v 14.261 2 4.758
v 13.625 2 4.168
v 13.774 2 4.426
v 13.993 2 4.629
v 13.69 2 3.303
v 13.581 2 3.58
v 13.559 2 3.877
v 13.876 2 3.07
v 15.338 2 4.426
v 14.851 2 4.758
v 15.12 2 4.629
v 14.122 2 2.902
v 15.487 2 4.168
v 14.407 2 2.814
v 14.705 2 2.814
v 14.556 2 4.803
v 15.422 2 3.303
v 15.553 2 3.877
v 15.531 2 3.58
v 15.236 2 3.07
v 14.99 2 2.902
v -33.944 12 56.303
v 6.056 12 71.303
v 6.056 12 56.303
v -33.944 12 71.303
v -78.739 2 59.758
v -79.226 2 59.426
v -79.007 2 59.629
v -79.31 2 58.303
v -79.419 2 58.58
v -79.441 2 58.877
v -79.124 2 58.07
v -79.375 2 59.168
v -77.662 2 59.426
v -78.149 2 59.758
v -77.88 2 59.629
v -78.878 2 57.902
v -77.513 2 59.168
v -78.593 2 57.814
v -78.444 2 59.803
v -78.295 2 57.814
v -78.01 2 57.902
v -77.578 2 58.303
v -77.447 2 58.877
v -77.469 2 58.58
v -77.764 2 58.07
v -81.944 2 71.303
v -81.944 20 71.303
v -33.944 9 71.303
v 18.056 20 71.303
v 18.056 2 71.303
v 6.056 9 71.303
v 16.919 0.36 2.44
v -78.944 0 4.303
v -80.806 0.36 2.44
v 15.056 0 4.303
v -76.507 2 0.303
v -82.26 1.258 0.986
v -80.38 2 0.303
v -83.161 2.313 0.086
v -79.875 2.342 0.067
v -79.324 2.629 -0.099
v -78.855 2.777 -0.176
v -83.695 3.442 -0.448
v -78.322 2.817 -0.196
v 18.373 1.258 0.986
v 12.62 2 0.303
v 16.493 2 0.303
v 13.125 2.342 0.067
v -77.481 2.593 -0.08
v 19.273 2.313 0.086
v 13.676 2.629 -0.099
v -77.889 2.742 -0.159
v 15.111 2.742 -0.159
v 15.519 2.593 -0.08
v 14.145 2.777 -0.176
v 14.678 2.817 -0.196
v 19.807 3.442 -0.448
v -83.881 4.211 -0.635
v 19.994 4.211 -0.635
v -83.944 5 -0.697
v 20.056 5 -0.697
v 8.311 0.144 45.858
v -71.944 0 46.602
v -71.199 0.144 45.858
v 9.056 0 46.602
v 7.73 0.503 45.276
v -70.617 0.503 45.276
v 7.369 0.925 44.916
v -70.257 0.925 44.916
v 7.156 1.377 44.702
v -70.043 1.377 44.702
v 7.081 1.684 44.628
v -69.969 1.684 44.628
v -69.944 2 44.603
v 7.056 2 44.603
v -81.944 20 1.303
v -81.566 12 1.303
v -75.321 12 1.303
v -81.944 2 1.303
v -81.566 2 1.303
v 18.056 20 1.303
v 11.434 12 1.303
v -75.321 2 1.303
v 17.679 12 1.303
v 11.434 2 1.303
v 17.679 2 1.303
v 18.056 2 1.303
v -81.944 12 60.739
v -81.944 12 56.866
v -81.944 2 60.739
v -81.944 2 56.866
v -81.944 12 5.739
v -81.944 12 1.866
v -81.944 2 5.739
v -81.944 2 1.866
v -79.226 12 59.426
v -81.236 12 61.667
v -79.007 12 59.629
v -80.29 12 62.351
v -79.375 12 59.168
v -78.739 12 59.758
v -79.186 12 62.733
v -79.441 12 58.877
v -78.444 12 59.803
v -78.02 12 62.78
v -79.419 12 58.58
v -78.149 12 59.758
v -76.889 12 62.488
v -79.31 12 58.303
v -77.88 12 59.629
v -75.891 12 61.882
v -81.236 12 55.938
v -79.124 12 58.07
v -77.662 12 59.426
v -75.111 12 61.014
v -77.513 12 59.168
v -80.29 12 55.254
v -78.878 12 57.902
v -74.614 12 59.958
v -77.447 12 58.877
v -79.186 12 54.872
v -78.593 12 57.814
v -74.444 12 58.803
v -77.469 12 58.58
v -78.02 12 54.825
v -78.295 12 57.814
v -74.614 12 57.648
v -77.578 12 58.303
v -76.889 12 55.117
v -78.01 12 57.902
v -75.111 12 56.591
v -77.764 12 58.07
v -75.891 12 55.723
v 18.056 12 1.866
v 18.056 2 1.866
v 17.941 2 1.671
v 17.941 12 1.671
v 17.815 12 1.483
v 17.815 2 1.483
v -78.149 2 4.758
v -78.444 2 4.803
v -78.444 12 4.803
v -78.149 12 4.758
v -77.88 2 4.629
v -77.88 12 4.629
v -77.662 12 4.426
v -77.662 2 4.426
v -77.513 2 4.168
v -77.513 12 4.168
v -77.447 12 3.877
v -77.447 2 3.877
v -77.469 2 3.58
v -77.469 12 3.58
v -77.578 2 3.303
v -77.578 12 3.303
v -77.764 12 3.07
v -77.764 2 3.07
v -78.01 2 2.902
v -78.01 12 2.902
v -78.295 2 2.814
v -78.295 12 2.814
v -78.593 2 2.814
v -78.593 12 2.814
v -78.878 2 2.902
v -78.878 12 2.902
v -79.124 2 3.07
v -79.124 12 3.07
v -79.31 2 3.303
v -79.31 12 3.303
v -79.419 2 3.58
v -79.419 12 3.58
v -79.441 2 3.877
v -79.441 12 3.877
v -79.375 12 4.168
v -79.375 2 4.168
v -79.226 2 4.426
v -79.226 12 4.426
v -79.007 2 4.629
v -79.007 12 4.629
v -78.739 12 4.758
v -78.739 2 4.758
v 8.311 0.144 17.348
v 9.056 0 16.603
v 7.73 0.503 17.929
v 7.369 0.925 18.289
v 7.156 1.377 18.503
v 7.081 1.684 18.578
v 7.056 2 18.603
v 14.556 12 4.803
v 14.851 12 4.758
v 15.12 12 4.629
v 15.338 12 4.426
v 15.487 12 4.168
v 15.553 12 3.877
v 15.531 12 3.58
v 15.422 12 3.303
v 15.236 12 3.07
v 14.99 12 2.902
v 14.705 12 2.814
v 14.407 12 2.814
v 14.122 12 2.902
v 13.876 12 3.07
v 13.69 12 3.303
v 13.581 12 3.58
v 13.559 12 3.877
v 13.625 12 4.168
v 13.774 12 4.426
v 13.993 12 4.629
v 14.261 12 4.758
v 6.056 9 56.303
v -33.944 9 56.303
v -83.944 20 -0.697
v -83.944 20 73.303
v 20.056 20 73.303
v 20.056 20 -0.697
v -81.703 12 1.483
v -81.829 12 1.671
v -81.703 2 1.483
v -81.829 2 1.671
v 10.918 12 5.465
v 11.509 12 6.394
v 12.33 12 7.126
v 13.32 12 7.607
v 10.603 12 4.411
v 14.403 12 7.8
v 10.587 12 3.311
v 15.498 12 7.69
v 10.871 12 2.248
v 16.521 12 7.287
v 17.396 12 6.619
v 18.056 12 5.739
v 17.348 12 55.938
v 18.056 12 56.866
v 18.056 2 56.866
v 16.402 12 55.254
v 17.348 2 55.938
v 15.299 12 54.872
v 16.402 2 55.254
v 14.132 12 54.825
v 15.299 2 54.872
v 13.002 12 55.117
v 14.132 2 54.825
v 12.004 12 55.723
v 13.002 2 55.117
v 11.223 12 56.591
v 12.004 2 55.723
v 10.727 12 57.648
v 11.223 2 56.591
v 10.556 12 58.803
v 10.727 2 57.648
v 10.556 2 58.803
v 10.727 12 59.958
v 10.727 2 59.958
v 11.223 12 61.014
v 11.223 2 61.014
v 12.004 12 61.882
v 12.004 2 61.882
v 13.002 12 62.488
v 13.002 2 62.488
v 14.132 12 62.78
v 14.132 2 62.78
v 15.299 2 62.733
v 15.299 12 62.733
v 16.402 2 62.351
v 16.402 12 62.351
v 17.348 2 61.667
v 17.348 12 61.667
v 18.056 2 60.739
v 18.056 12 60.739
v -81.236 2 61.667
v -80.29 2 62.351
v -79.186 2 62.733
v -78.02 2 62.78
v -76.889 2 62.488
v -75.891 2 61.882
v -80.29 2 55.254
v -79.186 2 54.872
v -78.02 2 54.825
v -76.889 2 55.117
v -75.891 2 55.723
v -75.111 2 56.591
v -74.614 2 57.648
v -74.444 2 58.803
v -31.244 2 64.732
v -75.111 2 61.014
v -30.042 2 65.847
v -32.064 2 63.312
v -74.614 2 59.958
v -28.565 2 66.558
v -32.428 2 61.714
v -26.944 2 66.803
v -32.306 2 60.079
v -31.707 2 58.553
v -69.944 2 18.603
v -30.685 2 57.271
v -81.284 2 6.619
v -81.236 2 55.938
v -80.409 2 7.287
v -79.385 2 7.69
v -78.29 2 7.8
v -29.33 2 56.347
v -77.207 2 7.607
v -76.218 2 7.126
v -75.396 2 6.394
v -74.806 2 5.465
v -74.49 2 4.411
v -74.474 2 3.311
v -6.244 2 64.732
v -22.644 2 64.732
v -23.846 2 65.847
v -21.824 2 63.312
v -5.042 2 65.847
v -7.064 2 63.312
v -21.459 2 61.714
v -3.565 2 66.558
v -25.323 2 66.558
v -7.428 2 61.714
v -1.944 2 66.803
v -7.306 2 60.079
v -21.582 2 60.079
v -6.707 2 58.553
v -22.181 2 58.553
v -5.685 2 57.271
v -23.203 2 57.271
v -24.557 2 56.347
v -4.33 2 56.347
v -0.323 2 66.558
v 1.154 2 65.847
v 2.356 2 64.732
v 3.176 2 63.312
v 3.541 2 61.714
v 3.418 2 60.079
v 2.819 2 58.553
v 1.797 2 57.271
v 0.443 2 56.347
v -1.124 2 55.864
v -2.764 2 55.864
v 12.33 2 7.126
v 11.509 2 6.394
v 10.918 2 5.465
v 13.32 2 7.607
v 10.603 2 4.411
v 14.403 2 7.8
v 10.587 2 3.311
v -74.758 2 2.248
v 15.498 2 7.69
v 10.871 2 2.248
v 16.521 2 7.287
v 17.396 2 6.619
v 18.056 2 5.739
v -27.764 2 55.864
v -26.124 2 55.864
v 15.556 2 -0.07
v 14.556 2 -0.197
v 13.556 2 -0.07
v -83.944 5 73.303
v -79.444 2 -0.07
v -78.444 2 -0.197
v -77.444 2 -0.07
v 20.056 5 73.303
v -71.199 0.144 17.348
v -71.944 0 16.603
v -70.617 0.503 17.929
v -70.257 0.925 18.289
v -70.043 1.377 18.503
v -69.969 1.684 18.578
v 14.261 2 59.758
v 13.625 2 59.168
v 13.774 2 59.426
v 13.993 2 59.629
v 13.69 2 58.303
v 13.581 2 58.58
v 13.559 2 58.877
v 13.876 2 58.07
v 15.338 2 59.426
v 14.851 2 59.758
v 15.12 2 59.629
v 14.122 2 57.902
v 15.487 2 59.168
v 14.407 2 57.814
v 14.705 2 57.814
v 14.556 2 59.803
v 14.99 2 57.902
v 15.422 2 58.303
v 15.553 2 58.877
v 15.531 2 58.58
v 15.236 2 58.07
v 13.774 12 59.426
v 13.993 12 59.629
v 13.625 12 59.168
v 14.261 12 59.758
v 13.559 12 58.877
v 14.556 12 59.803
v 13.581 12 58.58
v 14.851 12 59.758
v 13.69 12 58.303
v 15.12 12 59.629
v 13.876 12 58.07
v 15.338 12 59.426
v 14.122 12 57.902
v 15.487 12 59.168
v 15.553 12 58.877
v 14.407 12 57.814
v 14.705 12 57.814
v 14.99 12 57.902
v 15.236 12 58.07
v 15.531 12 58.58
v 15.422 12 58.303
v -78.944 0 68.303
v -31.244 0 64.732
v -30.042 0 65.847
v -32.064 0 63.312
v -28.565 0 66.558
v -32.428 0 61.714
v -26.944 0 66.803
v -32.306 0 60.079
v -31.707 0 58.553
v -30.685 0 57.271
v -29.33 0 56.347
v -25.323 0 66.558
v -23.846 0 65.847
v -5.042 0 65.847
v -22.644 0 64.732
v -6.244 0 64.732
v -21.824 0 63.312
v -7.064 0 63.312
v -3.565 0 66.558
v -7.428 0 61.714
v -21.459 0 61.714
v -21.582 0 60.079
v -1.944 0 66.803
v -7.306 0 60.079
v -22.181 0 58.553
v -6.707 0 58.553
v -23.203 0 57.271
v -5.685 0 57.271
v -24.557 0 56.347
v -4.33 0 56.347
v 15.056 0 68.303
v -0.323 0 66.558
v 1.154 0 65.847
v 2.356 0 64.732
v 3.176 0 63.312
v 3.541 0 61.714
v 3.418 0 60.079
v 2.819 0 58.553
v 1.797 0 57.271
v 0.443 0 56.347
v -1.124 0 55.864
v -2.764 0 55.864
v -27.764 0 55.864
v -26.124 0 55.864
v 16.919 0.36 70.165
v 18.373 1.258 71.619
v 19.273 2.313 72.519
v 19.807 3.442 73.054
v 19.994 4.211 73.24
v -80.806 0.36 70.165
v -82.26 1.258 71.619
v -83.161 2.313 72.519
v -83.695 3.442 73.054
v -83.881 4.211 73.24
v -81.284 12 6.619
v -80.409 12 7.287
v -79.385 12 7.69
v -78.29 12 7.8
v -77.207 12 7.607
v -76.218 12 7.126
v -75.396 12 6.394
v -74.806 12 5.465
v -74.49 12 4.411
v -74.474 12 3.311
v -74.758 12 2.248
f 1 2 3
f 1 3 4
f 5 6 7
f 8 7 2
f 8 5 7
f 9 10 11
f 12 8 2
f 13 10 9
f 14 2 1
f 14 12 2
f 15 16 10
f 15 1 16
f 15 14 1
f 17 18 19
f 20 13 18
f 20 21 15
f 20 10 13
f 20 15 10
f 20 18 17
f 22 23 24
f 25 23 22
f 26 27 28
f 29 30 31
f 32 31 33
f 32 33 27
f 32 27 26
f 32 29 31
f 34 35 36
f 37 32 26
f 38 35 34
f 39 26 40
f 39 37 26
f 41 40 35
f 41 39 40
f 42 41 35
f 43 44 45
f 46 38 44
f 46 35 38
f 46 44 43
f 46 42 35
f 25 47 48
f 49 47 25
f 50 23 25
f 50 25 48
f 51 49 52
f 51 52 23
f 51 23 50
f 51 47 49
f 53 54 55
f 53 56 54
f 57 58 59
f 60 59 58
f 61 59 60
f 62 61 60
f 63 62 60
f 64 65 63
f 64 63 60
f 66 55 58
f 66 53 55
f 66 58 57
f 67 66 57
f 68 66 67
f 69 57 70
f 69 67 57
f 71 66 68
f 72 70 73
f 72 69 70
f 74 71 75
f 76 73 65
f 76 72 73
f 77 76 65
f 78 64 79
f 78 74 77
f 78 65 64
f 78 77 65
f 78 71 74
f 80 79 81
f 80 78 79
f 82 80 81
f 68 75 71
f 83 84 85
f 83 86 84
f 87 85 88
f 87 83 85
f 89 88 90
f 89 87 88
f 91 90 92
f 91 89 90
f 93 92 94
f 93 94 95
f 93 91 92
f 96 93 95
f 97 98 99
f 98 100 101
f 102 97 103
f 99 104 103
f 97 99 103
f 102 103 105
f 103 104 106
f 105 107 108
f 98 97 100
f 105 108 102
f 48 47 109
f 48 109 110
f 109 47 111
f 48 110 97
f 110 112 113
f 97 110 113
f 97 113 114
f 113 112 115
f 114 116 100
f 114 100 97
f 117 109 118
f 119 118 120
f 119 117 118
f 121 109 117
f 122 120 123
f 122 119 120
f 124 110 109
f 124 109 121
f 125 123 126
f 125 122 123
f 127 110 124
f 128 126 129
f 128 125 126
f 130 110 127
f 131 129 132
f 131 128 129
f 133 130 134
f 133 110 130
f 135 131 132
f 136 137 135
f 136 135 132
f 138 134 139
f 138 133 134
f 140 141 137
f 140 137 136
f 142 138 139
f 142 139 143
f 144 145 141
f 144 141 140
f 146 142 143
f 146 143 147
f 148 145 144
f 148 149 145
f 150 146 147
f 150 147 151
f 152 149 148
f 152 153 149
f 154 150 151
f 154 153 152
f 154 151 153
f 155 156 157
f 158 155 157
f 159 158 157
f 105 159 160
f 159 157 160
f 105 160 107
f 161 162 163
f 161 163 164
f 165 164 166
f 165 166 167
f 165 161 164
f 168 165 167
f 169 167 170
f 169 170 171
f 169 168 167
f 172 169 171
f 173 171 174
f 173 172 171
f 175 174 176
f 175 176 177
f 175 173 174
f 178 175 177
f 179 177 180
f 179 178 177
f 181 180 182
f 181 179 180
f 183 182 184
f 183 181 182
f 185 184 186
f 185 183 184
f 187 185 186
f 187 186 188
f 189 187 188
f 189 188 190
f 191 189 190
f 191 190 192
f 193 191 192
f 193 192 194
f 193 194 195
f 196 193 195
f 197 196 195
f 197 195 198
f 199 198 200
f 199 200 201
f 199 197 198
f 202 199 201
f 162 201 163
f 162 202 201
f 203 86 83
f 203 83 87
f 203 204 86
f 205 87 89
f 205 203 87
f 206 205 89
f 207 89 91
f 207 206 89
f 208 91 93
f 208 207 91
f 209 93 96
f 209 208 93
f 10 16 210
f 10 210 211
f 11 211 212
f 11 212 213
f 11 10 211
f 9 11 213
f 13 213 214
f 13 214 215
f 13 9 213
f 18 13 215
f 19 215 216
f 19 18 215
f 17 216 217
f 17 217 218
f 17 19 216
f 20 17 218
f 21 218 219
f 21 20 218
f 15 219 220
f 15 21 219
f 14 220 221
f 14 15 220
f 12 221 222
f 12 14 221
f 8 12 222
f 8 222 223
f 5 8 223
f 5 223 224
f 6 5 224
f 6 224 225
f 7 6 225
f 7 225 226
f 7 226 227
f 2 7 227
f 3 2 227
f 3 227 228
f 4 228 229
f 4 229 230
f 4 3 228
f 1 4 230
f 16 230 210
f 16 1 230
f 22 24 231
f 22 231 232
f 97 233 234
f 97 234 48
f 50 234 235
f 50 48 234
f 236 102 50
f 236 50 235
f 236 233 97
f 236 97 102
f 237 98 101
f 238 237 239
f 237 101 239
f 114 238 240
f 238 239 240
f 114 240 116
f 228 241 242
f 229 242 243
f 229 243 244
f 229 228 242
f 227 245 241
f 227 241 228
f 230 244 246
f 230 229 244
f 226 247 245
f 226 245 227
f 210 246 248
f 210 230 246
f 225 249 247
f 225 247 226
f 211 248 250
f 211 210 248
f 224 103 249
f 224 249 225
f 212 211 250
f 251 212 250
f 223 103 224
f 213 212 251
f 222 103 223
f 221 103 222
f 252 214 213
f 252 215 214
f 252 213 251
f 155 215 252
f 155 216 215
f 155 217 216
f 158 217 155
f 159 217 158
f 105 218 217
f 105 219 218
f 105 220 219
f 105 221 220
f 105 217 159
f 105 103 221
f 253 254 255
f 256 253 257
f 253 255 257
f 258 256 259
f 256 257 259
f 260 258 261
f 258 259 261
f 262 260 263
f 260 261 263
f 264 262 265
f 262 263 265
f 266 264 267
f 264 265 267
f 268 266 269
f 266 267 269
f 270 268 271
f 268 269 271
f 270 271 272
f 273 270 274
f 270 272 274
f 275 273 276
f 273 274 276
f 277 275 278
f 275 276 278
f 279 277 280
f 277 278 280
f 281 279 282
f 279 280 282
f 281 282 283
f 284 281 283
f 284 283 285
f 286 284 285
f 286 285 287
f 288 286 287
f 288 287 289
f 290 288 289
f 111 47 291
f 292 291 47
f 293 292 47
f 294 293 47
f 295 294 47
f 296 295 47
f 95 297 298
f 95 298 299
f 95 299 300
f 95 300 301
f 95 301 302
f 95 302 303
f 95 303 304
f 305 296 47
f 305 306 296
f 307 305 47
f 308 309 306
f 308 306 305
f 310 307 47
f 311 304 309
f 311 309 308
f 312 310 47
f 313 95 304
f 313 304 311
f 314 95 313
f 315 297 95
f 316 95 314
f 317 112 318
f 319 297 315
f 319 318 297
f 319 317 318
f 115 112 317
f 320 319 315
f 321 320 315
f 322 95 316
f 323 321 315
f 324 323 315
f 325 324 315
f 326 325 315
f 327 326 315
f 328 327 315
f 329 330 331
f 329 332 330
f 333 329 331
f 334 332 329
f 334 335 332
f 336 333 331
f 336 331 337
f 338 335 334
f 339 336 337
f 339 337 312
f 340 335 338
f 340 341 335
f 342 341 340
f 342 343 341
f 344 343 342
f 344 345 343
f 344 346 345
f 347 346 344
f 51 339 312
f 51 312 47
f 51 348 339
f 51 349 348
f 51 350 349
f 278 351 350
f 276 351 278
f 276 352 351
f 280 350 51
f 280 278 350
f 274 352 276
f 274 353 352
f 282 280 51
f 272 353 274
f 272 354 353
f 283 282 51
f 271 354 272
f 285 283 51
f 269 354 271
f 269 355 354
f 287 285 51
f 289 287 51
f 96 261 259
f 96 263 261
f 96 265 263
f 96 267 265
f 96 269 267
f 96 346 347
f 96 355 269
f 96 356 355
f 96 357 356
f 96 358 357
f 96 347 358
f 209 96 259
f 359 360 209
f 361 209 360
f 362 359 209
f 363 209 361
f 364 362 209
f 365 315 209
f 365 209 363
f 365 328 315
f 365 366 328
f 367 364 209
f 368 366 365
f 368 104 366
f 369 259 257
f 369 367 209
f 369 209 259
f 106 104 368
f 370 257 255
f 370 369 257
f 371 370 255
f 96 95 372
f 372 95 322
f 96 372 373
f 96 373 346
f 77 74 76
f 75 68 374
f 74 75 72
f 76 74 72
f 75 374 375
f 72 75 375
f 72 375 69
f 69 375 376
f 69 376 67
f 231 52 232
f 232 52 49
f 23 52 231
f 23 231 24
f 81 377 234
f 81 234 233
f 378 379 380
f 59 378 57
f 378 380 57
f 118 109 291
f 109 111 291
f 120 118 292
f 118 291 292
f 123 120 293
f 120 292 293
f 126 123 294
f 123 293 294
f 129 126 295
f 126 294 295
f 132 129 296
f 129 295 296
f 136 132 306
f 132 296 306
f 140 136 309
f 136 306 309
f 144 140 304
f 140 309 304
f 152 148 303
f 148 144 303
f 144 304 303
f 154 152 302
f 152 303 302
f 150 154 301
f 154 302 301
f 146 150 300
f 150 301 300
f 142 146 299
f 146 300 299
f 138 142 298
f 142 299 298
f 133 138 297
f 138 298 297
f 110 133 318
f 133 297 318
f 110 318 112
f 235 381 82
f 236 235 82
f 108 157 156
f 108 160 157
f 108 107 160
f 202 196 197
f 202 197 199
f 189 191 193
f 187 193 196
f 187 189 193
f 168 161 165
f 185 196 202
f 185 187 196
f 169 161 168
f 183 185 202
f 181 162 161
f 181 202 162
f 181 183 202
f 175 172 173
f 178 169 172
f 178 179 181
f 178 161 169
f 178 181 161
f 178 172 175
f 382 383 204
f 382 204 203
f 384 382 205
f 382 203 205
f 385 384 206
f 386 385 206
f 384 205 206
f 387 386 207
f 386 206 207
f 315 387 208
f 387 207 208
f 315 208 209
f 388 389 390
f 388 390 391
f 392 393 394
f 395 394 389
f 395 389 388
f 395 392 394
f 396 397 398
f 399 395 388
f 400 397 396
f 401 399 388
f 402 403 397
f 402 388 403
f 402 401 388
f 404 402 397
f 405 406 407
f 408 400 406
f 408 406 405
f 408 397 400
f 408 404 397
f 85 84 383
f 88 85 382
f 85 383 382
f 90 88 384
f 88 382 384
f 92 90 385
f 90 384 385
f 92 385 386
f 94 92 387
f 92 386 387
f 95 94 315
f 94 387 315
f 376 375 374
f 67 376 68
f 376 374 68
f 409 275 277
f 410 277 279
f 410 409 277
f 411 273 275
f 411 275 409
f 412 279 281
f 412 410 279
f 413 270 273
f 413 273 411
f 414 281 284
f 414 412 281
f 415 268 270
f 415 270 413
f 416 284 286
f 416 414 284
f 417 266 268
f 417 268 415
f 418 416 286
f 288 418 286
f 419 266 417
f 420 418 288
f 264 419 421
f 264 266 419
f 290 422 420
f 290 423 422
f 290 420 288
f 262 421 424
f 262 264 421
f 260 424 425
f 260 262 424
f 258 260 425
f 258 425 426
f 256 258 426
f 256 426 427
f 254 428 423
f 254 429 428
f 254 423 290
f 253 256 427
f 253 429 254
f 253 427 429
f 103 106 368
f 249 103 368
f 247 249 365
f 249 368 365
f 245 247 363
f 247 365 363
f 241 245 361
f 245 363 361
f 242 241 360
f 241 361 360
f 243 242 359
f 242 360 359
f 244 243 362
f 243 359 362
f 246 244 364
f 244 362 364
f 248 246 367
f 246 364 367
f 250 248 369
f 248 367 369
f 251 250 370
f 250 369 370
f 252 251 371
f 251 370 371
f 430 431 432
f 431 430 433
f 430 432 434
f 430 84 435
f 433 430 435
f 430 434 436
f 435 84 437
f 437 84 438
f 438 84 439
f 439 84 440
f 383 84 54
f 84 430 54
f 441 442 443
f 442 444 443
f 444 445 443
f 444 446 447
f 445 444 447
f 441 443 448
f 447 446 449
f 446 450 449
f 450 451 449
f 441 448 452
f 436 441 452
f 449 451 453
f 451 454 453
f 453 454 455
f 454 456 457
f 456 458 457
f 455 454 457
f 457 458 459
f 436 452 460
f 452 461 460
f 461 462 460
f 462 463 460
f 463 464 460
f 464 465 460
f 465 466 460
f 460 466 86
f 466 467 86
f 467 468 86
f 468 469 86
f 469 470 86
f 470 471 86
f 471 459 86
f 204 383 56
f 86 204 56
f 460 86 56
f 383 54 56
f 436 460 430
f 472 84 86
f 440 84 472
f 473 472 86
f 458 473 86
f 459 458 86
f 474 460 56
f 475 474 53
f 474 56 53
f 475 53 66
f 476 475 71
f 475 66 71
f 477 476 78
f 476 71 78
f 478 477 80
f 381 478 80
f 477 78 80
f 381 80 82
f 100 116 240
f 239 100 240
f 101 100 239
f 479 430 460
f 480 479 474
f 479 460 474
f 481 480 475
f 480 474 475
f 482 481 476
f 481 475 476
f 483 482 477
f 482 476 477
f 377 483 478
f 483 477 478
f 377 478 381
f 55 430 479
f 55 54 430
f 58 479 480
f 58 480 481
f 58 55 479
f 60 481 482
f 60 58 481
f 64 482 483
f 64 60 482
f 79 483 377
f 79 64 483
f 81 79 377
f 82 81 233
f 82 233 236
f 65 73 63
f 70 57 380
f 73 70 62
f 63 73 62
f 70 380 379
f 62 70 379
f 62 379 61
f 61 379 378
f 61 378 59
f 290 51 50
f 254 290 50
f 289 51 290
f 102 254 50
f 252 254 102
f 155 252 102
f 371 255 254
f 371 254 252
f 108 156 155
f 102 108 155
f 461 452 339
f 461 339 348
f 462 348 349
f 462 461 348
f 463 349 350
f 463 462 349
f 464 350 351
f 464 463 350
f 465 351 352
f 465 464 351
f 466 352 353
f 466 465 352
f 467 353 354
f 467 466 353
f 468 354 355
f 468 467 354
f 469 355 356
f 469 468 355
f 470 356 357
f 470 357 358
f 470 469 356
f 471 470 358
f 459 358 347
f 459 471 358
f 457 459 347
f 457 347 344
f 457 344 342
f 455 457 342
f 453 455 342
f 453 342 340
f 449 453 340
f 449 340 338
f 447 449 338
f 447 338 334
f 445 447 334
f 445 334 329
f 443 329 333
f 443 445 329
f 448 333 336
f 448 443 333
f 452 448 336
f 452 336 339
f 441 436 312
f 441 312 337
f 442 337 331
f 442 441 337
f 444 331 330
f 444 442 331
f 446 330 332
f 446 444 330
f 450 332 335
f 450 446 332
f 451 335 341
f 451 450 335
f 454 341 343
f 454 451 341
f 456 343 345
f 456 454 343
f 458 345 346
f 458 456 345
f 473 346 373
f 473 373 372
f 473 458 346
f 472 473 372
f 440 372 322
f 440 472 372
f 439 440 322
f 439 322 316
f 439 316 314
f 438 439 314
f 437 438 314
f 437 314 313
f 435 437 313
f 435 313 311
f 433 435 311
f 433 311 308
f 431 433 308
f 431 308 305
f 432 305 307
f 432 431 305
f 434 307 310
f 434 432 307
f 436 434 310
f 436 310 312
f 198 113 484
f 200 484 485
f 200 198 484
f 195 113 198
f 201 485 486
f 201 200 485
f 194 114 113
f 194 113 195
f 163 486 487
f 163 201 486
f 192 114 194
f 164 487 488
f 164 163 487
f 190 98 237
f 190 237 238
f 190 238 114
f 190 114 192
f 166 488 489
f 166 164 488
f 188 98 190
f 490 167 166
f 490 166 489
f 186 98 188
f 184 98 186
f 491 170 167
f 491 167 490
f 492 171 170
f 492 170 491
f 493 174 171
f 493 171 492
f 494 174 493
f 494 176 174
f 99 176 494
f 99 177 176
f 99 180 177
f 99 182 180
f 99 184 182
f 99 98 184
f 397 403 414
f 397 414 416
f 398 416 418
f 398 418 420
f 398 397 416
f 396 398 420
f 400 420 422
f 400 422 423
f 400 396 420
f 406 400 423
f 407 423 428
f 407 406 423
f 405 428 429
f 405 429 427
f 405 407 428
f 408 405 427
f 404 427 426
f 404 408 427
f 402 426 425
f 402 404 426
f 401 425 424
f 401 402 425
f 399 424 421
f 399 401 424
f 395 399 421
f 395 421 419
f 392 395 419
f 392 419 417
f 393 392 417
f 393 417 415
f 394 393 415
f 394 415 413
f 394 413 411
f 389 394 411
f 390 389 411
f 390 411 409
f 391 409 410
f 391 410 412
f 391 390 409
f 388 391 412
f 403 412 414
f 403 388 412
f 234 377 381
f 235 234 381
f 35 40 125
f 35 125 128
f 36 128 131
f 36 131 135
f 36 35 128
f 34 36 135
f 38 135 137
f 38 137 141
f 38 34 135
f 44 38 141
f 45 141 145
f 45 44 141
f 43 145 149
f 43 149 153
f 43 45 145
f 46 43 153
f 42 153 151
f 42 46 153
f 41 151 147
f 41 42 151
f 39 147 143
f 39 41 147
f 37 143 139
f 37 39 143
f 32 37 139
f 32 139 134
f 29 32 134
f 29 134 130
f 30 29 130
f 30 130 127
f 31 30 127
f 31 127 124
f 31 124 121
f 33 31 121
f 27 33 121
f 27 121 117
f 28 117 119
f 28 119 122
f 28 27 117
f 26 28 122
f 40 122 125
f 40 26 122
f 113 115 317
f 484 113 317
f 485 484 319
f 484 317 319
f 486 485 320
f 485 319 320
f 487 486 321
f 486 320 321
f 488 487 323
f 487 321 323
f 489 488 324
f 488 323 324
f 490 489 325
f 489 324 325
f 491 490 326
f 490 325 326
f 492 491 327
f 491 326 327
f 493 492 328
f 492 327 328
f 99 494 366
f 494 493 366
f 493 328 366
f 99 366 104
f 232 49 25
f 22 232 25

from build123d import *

# Parameters (mm, degrees)
SKETCH1_W           = 104
SKETCH1_H           = 74
SKETCH1_W_2         = 100
SKETCH1_H_2         = 70
BOSS_EXTRUDE2_DEPTH = 20
SKETCH1_3_W         = 100
SKETCH1_3_H         = 70
SKETCH1_3_R         = 5.5
SKETCH1_3_W_2       = 77
SKETCH1_3_H_2       = 26
BOSS_EXTRUDE3_DEPTH = 2
FILLET1_R           = 5
FILLET2_R           = 2
SKETCH3_R           = 4
SKETCH3_R_2         = 1
BOSS_EXTRUDE4_DEPTH = 10
SKETCH4_W           = 40
SKETCH4_H           = 3
BOSS_EXTRUDE5_DEPTH = 15


with BuildPart() as part:
    # Sketch1 → Boss-Extrude2 (new body)
    with BuildSketch(Plane(origin=(0, 0, 0), x_dir=(1, 0, 0), z_dir=(0, 1, 0))):
        with Locations((-31.943816067, -36.302599947)):
            Rectangle(SKETCH1_W, SKETCH1_H)
        with Locations((-31.943816067, -36.302599947)):
            Rectangle(SKETCH1_W_2, SKETCH1_H_2, mode=Mode.SUBTRACT)
    extrude(amount=BOSS_EXTRUDE2_DEPTH)

    # Sketch1<3> → Boss-Extrude3 (add)
    with BuildSketch(Plane(origin=(0, 0, 0), x_dir=(1, 0, 0), z_dir=(0, 1, 0))):
        with Locations((-31.943816067, -36.302599947)):
            Rectangle(SKETCH1_3_W, SKETCH1_3_H)
        with Locations(Location((-1.943816067, -61.302599947, 0), (0, 0, 270))):
            Circle(SKETCH1_3_R, mode=Mode.SUBTRACT)
        with Locations(Location((-26.943816067, -61.302599947, 0), (0, 0, 270))):
            Circle(SKETCH1_3_R, mode=Mode.SUBTRACT)
        with Locations((-31.443816067, -31.602599947)):
            Rectangle(SKETCH1_3_W_2, SKETCH1_3_H_2, mode=Mode.SUBTRACT)
    extrude(amount=BOSS_EXTRUDE3_DEPTH)

    # Fillet1
    fillet1_edges = [part.edges().sort_by_distance(p)[0] for p in [
        (-83.943816067, 0, 36.302599947),
        (-31.943816067, 0, 73.302599947),
        (20.056183933, 0, 36.302599947),
        (-31.943816067, 0, -0.697400053),
    ]]
    fillet(fillet1_edges, radius=FILLET1_R)

    # Fillet2
    fillet2_edges = [part.edges().sort_by_distance(p)[0] for p in [
        (-69.943816067, 0, 31.602599947),
        (-31.443816067, 0, 44.602599947),
        (7.056183933, 0, 31.602599947),
        (-31.443816067, 0, 18.602599947),
    ]]
    fillet(fillet2_edges, radius=FILLET2_R - 0.0001)  # a hair under: the kernel refuses the full size

    # Sketch3 → Boss-Extrude4 (add)
    # profile 1 of 4: a face of its own
    with BuildSketch(Plane(origin=(0, 2, 0), x_dir=(1, 0, 0), z_dir=(0, 1, 0))):
        with Locations((-78.443816067, -3.802599947)):
            Circle(SKETCH3_R)
        with Locations(Location((-78.443816067, -3.802599947, 0), (0, 0, 270))):
            Circle(SKETCH3_R_2, mode=Mode.SUBTRACT)
    # profile 2 of 4: a face of its own
    with BuildSketch(Plane(origin=(0, 2, 0), x_dir=(1, 0, 0), z_dir=(0, 1, 0))):
        with Locations((14.556183933, -3.802599947)):
            Circle(SKETCH3_R)
        with Locations(Location((14.556183933, -3.802599947, 0), (0, 0, 270))):
            Circle(SKETCH3_R_2, mode=Mode.SUBTRACT)
    # profile 3 of 4: a face of its own
    with BuildSketch(Plane(origin=(0, 2, 0), x_dir=(1, 0, 0), z_dir=(0, 1, 0))):
        with Locations((-78.443816067, -58.802599947)):
            Circle(SKETCH3_R)
        with Locations(Location((-78.443816067, -58.802599947, 0), (0, 0, 270))):
            Circle(SKETCH3_R_2, mode=Mode.SUBTRACT)
    # profile 4 of 4: a face of its own
    with BuildSketch(Plane(origin=(0, 2, 0), x_dir=(1, 0, 0), z_dir=(0, 1, 0))):
        with Locations((14.556183933, -58.802599947)):
            Circle(SKETCH3_R)
        with Locations(Location((14.556183933, -58.802599947, 0), (0, 0, 270))):
            Circle(SKETCH3_R_2, mode=Mode.SUBTRACT)
    extrude(amount=BOSS_EXTRUDE4_DEPTH)

    # Sketch4 → Boss-Extrude5 (add)
    with BuildSketch(Plane(origin=(0, 0, 71.302599947), x_dir=(-1, 0, 0), z_dir=(0, 0, -1))):
        with Locations((13.943816067, 10.5)):
            Rectangle(SKETCH4_W, SKETCH4_H)
    extrude(amount=BOSS_EXTRUDE5_DEPTH)


solid = part.part
